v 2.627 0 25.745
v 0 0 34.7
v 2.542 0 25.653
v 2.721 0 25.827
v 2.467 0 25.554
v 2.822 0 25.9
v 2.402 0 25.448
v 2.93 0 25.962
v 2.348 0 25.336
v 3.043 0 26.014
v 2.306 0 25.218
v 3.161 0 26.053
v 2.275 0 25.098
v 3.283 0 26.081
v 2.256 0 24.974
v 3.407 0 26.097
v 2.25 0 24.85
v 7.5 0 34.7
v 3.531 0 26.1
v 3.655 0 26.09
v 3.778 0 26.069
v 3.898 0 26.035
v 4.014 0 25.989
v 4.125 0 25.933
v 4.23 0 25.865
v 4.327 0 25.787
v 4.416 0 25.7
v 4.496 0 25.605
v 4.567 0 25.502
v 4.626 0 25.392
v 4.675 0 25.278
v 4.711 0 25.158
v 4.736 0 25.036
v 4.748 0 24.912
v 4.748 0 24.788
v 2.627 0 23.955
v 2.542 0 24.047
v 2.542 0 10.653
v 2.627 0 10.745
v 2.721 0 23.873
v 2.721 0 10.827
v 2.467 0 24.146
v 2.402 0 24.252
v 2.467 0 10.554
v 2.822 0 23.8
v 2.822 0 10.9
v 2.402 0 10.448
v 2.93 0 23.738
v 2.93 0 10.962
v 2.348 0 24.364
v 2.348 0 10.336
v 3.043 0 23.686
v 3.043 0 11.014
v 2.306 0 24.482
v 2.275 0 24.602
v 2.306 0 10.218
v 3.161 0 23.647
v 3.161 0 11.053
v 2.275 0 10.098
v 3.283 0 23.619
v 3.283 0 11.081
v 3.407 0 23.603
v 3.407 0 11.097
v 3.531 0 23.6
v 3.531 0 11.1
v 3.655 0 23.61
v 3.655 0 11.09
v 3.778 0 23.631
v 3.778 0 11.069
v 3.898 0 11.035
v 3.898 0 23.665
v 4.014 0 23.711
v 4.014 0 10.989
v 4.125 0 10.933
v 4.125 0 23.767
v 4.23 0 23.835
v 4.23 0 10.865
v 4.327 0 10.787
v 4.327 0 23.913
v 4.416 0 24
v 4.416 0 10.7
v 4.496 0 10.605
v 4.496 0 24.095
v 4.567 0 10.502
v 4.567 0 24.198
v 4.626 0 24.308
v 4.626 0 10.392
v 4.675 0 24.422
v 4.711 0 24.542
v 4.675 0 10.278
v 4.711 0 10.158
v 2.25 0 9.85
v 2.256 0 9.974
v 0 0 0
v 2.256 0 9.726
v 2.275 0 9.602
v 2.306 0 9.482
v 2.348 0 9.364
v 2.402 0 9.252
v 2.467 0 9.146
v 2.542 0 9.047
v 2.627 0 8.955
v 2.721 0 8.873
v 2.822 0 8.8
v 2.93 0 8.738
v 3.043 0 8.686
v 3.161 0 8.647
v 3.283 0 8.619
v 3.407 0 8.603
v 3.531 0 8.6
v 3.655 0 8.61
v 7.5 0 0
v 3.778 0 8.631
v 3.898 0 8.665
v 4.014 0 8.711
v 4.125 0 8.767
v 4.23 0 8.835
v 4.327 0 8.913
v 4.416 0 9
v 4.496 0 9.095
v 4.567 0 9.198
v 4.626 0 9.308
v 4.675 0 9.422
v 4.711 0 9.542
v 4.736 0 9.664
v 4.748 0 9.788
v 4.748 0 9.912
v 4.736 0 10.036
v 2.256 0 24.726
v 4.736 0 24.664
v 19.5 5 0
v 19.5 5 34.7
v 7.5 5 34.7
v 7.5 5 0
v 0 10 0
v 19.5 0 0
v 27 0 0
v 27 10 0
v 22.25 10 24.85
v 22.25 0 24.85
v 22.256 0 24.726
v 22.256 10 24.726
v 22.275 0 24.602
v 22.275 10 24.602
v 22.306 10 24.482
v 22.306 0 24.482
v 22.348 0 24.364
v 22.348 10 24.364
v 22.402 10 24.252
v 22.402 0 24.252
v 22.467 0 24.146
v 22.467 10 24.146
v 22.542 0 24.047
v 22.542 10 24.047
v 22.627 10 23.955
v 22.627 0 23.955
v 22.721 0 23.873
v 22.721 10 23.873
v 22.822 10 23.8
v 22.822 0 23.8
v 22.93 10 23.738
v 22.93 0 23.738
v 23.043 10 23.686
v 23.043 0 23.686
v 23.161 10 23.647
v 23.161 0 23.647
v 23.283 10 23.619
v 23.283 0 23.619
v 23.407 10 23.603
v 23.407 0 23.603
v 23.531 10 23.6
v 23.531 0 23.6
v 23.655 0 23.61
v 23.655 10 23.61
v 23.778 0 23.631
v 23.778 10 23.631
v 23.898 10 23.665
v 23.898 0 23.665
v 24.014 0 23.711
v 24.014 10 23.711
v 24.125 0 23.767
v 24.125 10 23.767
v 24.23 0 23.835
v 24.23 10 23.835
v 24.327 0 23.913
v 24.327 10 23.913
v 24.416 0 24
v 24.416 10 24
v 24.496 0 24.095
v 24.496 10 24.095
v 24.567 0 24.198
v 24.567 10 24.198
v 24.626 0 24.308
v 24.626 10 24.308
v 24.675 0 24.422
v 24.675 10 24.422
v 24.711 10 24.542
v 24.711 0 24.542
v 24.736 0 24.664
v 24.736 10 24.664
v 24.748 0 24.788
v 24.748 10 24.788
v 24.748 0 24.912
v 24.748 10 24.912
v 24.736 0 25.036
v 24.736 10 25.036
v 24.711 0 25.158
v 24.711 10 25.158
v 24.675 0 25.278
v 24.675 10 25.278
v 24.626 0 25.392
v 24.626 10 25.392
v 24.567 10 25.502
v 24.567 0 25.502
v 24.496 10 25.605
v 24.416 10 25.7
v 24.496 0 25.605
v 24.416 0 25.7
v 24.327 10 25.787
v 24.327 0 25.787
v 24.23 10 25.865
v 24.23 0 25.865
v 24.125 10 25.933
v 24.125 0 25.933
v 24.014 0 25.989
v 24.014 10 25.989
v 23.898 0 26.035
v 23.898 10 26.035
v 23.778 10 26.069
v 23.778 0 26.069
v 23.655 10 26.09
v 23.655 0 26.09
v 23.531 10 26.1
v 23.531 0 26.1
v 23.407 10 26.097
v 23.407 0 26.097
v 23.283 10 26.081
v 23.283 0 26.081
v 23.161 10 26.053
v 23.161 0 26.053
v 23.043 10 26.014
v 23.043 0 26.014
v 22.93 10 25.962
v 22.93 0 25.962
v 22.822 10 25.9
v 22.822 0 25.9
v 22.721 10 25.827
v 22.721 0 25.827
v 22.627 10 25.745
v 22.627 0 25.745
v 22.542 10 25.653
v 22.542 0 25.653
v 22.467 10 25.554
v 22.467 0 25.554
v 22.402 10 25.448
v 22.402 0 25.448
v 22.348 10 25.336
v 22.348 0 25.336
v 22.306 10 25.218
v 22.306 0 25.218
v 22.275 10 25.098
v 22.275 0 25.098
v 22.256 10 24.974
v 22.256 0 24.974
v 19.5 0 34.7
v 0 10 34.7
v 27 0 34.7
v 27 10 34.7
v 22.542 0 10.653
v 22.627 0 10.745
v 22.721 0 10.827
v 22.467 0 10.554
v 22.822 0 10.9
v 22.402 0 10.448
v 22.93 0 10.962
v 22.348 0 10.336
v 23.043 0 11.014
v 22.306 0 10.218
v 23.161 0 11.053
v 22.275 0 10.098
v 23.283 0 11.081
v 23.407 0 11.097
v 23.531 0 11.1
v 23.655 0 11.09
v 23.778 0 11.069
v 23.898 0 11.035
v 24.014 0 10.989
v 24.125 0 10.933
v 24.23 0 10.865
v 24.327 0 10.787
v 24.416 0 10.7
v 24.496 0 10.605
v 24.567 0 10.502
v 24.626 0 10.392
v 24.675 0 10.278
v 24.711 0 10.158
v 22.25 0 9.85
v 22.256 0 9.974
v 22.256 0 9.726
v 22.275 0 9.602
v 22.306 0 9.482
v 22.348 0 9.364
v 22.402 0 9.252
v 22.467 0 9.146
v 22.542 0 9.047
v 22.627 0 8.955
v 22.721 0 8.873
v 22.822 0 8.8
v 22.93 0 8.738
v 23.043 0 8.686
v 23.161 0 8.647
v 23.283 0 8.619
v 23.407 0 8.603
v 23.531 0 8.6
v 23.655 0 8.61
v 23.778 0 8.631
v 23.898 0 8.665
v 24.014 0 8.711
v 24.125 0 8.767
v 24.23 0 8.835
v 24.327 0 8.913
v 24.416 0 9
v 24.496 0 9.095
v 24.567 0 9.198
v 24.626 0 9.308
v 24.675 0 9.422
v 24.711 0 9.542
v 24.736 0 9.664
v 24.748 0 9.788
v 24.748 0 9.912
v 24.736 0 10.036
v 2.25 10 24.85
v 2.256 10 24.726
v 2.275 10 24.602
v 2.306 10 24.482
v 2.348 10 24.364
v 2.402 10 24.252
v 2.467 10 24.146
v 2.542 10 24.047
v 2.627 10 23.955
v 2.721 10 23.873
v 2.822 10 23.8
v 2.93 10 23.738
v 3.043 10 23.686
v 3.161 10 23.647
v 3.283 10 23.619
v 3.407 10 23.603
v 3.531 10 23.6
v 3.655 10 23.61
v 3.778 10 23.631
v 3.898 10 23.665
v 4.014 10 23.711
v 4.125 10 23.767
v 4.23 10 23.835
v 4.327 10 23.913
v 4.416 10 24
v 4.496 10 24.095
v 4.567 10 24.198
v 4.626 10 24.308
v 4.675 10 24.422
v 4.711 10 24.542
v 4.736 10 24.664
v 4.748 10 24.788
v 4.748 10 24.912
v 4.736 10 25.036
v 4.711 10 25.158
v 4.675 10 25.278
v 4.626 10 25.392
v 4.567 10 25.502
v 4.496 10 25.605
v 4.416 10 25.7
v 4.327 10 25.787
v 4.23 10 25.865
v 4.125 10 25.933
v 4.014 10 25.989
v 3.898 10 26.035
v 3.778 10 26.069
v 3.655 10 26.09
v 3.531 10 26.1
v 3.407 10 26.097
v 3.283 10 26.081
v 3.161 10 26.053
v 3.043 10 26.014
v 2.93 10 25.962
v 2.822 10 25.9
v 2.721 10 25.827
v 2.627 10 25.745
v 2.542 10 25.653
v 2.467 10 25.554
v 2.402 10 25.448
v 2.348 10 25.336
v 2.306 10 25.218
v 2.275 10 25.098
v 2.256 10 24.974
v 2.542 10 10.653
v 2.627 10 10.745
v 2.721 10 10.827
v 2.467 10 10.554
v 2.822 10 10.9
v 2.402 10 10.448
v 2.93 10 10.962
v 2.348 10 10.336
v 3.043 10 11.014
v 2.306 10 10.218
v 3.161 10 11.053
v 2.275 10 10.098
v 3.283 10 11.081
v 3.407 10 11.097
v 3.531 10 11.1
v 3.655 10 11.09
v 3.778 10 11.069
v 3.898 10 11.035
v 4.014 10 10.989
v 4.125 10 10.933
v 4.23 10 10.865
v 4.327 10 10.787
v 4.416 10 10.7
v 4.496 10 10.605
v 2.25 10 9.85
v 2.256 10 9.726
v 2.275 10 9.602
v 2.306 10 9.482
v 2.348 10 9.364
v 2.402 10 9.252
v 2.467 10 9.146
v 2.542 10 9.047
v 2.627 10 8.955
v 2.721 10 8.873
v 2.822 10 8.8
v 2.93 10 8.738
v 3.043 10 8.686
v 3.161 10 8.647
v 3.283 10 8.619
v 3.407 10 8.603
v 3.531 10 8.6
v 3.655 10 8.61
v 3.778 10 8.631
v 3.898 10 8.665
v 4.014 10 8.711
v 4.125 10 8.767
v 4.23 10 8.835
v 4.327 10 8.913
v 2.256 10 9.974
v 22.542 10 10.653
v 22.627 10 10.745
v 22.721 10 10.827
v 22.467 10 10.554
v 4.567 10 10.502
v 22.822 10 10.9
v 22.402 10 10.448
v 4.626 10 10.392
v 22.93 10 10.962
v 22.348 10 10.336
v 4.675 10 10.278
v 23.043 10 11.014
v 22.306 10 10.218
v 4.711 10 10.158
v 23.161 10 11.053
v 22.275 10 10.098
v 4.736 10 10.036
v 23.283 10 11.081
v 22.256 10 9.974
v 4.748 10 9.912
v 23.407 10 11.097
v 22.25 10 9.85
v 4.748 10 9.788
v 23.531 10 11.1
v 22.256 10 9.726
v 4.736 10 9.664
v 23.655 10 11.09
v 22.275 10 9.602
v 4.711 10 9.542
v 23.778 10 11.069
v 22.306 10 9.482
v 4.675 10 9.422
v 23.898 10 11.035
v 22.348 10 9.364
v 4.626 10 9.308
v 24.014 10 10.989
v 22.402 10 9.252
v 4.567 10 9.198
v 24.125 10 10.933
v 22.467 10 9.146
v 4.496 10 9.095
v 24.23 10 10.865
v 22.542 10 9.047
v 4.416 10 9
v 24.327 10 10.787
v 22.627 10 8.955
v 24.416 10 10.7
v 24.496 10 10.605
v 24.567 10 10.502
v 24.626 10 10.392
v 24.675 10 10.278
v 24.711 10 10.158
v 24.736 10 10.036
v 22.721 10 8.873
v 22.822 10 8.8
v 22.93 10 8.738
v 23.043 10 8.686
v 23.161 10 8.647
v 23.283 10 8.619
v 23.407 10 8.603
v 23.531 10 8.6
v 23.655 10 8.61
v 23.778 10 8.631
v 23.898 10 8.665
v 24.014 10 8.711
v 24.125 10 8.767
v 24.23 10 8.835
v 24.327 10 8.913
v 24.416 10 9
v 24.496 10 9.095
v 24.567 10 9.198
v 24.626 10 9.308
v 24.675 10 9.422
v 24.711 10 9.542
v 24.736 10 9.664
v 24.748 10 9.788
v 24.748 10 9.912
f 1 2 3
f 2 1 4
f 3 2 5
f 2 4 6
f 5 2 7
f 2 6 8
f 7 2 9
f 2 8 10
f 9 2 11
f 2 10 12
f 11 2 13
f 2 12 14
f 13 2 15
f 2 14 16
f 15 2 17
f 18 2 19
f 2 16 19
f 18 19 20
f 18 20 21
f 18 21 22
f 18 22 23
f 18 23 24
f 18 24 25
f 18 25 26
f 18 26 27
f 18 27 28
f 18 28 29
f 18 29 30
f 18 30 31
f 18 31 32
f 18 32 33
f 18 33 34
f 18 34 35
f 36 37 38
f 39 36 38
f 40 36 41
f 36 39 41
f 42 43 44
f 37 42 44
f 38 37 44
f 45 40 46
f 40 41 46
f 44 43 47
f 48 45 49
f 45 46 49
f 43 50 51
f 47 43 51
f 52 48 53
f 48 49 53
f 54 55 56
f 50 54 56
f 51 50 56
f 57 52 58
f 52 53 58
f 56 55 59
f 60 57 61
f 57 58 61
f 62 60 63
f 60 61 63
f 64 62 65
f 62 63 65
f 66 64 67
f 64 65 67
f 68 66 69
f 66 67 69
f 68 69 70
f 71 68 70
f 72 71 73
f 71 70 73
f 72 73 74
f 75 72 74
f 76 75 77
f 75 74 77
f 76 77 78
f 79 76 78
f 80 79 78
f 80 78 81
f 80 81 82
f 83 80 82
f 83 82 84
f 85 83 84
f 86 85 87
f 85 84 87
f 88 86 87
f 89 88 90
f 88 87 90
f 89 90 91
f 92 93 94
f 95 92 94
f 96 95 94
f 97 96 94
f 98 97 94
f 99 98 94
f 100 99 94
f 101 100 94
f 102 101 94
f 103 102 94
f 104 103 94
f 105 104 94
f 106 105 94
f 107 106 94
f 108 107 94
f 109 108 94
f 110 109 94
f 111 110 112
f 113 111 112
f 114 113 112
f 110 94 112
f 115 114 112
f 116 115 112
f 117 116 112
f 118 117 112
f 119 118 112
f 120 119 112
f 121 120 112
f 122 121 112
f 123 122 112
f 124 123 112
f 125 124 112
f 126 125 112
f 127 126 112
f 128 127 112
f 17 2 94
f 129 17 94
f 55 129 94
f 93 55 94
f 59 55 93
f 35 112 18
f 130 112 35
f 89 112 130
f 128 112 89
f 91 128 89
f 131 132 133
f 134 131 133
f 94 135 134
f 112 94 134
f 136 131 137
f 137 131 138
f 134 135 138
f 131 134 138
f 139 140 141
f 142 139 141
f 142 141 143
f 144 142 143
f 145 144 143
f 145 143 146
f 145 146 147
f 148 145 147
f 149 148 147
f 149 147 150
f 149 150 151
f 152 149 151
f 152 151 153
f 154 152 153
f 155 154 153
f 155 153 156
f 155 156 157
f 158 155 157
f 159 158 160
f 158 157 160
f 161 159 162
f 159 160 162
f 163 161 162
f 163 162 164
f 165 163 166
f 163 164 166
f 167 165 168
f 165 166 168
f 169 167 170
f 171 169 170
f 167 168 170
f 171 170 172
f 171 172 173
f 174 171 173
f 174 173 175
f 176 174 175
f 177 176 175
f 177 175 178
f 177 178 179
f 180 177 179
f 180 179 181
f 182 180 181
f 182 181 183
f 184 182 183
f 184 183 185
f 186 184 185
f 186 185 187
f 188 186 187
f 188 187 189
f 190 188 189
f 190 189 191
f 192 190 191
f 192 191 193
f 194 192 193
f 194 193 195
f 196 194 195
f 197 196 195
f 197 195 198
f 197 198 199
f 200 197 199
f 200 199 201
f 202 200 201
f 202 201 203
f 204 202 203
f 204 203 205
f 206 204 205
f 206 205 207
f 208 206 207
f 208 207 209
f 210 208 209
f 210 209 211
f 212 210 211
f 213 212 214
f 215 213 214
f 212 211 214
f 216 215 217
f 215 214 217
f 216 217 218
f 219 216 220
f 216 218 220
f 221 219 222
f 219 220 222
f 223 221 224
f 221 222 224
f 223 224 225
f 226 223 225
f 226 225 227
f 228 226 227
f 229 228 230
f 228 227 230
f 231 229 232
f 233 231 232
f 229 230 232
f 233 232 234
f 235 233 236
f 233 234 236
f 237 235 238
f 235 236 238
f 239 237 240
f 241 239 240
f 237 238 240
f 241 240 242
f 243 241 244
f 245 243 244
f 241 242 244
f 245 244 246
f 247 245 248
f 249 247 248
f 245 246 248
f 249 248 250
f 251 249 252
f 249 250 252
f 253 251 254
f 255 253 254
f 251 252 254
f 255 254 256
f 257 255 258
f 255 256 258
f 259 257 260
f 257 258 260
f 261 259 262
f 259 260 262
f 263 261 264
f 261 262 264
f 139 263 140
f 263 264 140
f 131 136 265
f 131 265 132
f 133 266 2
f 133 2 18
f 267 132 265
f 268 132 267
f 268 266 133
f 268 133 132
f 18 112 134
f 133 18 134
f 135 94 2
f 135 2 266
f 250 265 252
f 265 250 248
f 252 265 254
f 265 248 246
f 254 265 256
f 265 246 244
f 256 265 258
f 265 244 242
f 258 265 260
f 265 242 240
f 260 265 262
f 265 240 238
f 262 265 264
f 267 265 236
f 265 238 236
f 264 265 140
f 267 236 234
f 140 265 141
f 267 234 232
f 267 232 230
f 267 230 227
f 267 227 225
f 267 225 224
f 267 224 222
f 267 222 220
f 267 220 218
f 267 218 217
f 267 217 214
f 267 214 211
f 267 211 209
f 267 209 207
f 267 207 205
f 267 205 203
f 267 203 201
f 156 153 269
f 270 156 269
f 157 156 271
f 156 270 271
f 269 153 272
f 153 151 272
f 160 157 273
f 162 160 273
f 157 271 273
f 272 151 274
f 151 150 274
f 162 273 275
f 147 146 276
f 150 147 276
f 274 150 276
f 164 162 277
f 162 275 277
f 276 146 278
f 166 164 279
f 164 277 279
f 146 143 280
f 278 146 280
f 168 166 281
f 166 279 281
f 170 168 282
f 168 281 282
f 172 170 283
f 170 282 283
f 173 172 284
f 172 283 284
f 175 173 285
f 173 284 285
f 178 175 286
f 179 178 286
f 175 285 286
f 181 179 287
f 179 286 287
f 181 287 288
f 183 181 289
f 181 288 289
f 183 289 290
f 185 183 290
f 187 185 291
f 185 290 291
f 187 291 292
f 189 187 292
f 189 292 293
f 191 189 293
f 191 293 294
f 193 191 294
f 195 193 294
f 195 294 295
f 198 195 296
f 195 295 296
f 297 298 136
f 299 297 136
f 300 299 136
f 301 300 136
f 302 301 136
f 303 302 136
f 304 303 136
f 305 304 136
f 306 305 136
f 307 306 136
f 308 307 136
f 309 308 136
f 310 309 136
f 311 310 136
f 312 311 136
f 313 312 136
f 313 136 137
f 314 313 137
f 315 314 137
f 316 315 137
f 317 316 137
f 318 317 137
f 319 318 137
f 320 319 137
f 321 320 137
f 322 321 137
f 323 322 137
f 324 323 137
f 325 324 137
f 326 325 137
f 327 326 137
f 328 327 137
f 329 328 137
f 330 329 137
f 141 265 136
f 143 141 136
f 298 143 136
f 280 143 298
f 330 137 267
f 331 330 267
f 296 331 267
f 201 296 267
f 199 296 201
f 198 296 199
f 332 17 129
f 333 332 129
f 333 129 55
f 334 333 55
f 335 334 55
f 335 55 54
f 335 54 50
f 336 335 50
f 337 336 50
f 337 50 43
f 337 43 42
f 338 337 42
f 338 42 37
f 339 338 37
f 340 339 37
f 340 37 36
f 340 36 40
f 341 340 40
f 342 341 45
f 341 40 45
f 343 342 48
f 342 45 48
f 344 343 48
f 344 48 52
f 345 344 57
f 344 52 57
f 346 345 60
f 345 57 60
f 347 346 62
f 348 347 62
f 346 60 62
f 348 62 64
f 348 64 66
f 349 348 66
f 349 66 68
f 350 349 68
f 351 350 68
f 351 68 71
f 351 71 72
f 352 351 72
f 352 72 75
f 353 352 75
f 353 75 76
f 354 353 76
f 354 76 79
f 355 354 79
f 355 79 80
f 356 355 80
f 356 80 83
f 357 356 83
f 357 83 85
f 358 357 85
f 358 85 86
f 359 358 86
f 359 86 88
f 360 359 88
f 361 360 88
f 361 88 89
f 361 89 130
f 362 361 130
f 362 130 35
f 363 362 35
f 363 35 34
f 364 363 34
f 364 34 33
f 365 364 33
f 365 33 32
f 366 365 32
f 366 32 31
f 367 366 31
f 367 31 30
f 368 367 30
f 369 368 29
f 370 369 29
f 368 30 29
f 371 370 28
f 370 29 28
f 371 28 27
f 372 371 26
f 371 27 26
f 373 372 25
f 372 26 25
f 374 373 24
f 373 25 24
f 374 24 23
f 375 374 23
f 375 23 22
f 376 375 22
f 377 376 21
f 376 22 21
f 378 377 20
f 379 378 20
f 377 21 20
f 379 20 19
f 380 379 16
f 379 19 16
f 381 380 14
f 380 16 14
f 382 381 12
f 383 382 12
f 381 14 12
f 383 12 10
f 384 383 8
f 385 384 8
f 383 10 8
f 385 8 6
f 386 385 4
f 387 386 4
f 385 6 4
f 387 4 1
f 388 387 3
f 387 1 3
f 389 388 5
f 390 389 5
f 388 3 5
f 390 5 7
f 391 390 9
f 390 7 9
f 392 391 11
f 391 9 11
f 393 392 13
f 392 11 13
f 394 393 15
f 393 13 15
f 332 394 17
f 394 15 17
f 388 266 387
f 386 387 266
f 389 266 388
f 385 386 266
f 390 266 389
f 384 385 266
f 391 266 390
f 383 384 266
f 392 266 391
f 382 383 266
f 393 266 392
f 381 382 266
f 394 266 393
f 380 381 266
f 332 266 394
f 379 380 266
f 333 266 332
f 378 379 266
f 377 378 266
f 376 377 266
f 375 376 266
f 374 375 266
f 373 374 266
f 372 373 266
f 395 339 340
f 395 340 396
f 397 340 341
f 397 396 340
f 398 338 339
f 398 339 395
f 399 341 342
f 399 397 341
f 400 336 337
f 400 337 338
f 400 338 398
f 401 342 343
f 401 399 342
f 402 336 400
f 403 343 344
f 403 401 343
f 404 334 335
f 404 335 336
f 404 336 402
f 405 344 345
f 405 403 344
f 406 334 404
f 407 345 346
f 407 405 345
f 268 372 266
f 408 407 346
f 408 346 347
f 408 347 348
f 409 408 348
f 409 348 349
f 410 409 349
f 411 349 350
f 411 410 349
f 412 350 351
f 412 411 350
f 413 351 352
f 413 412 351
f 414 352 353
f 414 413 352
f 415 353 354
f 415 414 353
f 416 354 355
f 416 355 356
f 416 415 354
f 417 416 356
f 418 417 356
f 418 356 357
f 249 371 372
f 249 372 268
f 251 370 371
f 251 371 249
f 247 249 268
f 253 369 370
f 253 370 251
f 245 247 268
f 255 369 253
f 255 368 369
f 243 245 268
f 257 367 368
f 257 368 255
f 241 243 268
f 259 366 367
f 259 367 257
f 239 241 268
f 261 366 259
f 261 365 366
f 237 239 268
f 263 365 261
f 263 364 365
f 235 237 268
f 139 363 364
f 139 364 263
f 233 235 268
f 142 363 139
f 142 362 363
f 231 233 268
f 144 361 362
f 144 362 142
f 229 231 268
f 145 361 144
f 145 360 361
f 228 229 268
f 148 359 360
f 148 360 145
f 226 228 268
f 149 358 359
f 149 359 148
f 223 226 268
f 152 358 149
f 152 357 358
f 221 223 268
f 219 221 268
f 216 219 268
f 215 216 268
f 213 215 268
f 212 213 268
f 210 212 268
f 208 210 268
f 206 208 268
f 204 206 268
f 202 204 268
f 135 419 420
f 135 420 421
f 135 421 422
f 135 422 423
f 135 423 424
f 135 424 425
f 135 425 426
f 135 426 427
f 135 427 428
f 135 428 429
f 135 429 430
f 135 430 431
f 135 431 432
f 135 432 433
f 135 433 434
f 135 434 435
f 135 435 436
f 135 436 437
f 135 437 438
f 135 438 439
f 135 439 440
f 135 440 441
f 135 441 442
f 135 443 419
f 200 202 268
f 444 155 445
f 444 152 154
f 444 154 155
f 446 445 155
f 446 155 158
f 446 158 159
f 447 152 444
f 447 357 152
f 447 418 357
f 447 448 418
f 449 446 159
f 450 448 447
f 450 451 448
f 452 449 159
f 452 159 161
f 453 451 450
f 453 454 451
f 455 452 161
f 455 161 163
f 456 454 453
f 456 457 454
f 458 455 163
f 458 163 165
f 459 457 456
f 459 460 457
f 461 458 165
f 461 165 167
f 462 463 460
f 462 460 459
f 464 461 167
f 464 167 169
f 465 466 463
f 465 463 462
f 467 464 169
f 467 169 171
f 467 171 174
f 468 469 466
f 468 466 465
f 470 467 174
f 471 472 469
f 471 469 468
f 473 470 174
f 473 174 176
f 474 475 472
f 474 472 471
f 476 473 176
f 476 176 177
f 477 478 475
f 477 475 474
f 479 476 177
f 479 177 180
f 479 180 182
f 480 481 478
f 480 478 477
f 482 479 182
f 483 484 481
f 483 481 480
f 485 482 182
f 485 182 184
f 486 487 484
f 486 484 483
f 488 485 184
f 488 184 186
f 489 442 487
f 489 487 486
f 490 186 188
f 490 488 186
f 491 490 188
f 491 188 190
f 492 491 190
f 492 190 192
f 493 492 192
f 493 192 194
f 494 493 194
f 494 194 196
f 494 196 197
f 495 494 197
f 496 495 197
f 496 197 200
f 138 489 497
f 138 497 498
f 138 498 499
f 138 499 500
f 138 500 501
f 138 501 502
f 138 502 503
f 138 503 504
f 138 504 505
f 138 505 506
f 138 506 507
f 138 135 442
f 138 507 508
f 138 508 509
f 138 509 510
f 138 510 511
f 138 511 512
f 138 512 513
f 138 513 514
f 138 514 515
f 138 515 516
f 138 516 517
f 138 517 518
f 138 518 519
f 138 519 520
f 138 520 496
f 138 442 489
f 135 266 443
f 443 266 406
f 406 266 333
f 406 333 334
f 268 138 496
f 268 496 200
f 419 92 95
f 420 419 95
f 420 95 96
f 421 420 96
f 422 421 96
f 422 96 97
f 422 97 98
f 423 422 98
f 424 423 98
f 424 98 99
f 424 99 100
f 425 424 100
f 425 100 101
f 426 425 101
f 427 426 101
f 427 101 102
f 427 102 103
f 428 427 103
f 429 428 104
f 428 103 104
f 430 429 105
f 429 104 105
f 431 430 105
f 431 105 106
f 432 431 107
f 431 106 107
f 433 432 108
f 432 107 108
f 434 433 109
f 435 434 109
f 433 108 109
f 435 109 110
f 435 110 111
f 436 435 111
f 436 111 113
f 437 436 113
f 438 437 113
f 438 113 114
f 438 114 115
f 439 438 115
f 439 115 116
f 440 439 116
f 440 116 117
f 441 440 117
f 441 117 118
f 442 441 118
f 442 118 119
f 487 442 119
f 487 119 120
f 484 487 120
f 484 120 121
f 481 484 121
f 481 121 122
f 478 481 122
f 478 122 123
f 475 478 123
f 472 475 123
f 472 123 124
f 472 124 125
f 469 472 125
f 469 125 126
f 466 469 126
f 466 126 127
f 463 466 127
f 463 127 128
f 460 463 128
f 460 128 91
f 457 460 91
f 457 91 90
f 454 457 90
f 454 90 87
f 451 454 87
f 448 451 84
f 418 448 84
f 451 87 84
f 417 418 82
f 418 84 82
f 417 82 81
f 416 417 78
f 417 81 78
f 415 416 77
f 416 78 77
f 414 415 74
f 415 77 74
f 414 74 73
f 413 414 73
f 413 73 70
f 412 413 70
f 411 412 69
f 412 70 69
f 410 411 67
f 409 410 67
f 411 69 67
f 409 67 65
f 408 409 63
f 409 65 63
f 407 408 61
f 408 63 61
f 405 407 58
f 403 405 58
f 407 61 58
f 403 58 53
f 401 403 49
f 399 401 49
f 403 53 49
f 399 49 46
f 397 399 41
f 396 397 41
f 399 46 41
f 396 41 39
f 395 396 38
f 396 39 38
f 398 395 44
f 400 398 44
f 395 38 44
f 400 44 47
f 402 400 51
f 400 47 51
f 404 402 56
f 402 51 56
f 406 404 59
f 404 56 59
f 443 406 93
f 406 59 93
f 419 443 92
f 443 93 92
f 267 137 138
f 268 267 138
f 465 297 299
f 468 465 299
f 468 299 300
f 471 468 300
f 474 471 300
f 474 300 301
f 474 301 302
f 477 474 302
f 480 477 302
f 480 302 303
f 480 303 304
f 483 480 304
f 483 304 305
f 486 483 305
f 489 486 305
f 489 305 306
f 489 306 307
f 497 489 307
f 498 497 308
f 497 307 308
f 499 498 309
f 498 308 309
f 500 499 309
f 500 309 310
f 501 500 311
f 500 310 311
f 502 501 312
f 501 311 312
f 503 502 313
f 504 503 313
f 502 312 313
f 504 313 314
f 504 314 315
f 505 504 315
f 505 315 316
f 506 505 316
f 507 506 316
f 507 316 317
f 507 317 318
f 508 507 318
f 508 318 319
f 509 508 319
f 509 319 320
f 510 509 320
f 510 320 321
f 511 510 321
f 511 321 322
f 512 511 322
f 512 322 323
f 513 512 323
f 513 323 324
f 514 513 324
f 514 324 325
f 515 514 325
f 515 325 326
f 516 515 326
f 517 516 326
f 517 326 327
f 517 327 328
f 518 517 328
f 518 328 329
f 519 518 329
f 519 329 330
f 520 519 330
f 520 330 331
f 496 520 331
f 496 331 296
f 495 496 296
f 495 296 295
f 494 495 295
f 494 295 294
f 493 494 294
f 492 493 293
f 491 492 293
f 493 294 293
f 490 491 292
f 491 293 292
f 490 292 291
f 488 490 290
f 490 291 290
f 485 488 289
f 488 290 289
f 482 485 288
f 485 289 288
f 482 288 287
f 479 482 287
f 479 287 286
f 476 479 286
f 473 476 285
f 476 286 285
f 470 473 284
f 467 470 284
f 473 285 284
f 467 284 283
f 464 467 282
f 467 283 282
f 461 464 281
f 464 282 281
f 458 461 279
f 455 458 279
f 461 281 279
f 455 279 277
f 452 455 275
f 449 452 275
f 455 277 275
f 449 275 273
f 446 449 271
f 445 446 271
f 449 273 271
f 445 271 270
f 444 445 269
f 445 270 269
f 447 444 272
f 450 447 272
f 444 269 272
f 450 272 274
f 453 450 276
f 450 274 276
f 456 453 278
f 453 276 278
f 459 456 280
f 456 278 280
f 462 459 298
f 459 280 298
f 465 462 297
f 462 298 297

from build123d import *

# Parameters (mm, degrees)
SKETCH_1_W          = 27
SKETCH_1_H          = 10
EXTRUDE_1_DEPTH     = 34.7
SKETCH_2_W          = 12
SKETCH_2_H          = 5
CUT_EXTRUDE_1_DEPTH = 35.7
HOLE_WIZARD_M3_1_D  = 2.5


with BuildPart() as part:
    # 草图1 → 凸台-拉伸1 (new body)
    with BuildSketch(Plane.XY):
        with Locations((13.5, 5)):
            Rectangle(SKETCH_1_W, SKETCH_1_H)
    extrude(amount=EXTRUDE_1_DEPTH)

    # 草图2 → 切除-拉伸1 (cut, through all)
    with BuildSketch(Plane(origin=(0, 0, 0), x_dir=(-1, 0, 0), z_dir=(0, 0, -1))):
        with Locations((-13.5, 2.5)):
            Rectangle(SKETCH_2_W, SKETCH_2_H)
    extrude(amount=-CUT_EXTRUDE_1_DEPTH, mode=Mode.SUBTRACT)

    # M3 螺纹孔1 (through all)
    with Locations(Plane(origin=(0, 10, 0), x_dir=(1, 0, 0), z_dir=(0, 1, 0))):
        with Locations((23.5, -24.85), (23.5, -9.85), (3.5, -24.85), (3.5, -9.85)):
            Hole(HOLE_WIZARD_M3_1_D / 2)


solid = part.part
